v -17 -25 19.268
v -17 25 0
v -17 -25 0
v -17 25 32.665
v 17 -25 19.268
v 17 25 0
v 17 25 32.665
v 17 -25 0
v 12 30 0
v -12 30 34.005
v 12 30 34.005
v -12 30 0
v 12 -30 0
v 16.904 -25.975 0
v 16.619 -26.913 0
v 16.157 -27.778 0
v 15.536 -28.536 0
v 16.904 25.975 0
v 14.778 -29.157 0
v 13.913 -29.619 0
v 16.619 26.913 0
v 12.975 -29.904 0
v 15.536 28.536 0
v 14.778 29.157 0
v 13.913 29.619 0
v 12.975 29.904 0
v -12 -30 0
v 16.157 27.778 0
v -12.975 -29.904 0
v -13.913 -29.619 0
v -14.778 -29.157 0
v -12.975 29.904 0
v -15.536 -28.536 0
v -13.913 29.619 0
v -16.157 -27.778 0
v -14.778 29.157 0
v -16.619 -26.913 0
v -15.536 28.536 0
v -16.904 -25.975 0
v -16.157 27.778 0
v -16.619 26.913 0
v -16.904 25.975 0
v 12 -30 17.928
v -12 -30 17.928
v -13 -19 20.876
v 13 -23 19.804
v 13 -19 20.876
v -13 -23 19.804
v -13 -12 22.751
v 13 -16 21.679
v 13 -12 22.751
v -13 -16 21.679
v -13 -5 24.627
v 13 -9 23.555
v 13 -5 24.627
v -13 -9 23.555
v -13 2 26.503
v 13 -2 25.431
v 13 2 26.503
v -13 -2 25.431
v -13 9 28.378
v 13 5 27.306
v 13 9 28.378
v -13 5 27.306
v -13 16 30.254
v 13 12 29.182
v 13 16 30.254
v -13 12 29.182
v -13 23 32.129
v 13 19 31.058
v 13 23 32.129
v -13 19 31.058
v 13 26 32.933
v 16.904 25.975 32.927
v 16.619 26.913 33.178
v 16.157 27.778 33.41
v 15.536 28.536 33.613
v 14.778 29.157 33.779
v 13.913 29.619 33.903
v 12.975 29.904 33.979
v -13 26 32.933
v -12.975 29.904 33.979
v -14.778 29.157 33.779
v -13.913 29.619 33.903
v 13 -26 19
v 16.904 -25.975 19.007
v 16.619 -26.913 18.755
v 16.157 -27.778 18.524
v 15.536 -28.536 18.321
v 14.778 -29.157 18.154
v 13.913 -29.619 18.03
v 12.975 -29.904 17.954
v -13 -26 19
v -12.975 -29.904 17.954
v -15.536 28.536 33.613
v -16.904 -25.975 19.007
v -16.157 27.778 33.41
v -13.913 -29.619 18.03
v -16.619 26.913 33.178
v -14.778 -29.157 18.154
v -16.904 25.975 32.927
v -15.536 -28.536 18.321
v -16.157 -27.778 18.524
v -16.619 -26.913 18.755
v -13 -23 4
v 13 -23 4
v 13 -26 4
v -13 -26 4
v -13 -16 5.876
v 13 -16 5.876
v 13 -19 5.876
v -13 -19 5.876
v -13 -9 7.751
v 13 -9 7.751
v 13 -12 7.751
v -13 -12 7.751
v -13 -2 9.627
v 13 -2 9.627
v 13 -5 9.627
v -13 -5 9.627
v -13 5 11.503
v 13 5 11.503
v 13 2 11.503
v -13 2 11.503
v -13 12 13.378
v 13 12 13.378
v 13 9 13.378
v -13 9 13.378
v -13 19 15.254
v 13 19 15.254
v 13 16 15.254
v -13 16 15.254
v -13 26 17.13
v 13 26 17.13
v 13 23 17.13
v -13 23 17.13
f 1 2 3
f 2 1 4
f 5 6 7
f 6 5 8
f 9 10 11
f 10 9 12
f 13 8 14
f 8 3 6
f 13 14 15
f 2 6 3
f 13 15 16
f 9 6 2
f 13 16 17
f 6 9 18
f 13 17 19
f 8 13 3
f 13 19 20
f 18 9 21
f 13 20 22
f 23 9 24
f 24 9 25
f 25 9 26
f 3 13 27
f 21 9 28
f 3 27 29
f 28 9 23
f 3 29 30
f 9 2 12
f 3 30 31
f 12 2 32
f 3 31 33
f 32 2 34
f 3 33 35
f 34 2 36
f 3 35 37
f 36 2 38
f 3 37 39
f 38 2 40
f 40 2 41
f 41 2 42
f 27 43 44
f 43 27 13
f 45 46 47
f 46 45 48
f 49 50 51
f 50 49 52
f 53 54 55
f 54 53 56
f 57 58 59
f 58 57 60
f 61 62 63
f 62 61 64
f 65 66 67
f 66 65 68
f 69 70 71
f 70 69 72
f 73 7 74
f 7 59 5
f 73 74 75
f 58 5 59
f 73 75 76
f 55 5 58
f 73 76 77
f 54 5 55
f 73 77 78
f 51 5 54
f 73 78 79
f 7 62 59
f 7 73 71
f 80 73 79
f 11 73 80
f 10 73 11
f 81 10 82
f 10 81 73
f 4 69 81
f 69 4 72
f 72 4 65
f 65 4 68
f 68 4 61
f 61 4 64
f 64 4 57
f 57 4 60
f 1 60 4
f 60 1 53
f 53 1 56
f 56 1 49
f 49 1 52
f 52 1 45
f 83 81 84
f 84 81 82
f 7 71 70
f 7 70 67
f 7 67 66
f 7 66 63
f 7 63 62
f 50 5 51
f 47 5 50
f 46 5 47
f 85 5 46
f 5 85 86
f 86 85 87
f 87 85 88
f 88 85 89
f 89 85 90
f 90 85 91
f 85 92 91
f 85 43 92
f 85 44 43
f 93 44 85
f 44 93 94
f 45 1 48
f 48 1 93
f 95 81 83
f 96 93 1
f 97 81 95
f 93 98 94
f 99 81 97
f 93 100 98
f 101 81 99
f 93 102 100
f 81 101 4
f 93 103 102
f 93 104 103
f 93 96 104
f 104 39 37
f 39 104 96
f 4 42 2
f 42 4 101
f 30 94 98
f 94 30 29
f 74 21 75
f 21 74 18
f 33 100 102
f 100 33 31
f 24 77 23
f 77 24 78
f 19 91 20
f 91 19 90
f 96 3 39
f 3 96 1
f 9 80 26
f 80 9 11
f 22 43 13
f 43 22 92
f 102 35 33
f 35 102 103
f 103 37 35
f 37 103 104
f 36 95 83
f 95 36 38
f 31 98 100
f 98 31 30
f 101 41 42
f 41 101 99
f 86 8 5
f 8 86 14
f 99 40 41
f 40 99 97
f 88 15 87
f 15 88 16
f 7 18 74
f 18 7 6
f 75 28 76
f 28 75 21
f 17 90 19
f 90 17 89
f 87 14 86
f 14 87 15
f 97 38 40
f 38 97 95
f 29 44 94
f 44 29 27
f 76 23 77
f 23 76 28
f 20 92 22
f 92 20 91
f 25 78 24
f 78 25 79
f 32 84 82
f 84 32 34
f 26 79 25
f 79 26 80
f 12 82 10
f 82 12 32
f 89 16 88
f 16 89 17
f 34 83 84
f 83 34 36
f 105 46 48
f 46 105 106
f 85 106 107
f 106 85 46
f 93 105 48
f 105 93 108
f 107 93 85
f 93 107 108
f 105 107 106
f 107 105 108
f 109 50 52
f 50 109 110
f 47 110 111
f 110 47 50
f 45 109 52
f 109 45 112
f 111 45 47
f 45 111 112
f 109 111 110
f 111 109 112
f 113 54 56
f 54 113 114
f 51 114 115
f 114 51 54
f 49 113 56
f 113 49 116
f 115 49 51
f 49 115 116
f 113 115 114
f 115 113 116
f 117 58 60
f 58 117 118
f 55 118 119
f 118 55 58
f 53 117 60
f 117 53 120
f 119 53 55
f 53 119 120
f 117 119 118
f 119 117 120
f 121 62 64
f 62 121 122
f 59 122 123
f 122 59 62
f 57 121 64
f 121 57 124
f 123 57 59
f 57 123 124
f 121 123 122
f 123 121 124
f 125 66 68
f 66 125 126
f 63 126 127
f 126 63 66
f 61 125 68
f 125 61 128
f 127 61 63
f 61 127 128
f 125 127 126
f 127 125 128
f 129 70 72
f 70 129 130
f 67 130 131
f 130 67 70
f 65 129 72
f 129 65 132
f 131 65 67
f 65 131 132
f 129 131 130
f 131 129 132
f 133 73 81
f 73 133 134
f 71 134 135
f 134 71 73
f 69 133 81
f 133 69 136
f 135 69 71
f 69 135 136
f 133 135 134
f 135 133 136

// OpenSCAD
// Parametric SD Card Holder Remix by Bikecyclist
//
// New features:
// - Rounded corners
// - Customizer-enabled
//
// Published at:
//    http://www.thingiverse.com/thing:3470191
//
// Derivative of Parameterized SD card holder, PAmes
//
// Published at:
//    http://www.thingiverse.com/thing:15323
//
// Derivative of http://www.thingiverse.com/thing:9218 by jpcw
//
// Can adjust the number of slots, the slot size, and the corner radius

// The slot, of course, should be a little larger than the card.
// Adjust for desired fit.  I use these numbers on my TOM/Mk7,
// which give a slightly loose fit (the cards will fall out easily
// if turned over).  If you want to adjust the slot size, try
// experimenting by setting 'slots' to 1.
// All units are mm.

/* [Slots] */

// Number of slots - as many or as few as you want
slots = 8;  

// With of slots (SD Card = 26 mm)
slotWidth = 26;

// Thickness of slots, front to back (SD Card = 3 mm)
slotThickness = 3;

// Barrier between slots
slotSeparation = 4;

// Depth of slots - half of the card height seems about right.
slotDepth = 15;

/* [Holder] */

// Angle of the holder's top surface (in degrees)
topRiseAngle = 15;

// Corner radius of the holder's body
corner_radius = 5;

/* [Hidden] */

// Number of facets
$fn = 32;


// These should be OK as is.  Adjust if you want wider borders.
bottomHeight = slotSeparation; // bottom of first hole to bottom of holder
sideWidth    = slotSeparation; // left, right borders
frontDepth   = slotSeparation; // front to first hole
backDepth    = slotSeparation; // back to last hole


// Shouldn't have to mess with these.
holderWidth = slotWidth + 2*sideWidth;
holderFrontHeight = slotDepth + bottomHeight - tan(topRiseAngle)*frontDepth;
holderDepth = frontDepth + slotThickness*slots +
            slotSeparation*(slots-1) + backDepth;
holderBackHeight = holderFrontHeight + tan(topRiseAngle)*holderDepth;

module basicBlock() {
  linear_extrude(height=holderWidth, convexity=2)
    polygon(points = [ [0, 0],
                     [holderDepth, 0],
                     [holderDepth, holderBackHeight],
                     [0, holderFrontHeight] ]);
}

module BlockRounded() {
    hull ()
        for (i = [0, 1], j = [0, 1])
            translate ([corner_radius + i * (holderDepth - 2 * corner_radius), corner_radius + j * (holderWidth - 2 * corner_radius), -0.01])
                cylinder (r = corner_radius, h = holderBackHeight + 0.02);
}

// One slot, at first location
module slot() {
  translate([frontDepth, bottomHeight,0])
    translate([0,0,sideWidth])
      cube(size=[slotThickness, holderBackHeight, slotWidth]); // sticks up, used by difference()
}

// Makes all slots
module slots() {
  for (i = [0 : slots-1]) {
    translate([i*(slotSeparation+slotThickness), i*tan(topRiseAngle)*(slotSeparation+slotThickness), 0])
      slot();
  }
}

// Put it all together
module SDCardHolder() {
  // Place into nice orientation
  rotate([0,0,90])
    translate([-holderDepth/2,holderWidth/2,0])
      rotate([90,0,0])
        difference() {
          intersection ()
          {
            basicBlock();
            
            translate ([0, holderBackHeight, 0])
            rotate([90,0,0])
            BlockRounded();
          }
          slots();
        }
}

SDCardHolder();
